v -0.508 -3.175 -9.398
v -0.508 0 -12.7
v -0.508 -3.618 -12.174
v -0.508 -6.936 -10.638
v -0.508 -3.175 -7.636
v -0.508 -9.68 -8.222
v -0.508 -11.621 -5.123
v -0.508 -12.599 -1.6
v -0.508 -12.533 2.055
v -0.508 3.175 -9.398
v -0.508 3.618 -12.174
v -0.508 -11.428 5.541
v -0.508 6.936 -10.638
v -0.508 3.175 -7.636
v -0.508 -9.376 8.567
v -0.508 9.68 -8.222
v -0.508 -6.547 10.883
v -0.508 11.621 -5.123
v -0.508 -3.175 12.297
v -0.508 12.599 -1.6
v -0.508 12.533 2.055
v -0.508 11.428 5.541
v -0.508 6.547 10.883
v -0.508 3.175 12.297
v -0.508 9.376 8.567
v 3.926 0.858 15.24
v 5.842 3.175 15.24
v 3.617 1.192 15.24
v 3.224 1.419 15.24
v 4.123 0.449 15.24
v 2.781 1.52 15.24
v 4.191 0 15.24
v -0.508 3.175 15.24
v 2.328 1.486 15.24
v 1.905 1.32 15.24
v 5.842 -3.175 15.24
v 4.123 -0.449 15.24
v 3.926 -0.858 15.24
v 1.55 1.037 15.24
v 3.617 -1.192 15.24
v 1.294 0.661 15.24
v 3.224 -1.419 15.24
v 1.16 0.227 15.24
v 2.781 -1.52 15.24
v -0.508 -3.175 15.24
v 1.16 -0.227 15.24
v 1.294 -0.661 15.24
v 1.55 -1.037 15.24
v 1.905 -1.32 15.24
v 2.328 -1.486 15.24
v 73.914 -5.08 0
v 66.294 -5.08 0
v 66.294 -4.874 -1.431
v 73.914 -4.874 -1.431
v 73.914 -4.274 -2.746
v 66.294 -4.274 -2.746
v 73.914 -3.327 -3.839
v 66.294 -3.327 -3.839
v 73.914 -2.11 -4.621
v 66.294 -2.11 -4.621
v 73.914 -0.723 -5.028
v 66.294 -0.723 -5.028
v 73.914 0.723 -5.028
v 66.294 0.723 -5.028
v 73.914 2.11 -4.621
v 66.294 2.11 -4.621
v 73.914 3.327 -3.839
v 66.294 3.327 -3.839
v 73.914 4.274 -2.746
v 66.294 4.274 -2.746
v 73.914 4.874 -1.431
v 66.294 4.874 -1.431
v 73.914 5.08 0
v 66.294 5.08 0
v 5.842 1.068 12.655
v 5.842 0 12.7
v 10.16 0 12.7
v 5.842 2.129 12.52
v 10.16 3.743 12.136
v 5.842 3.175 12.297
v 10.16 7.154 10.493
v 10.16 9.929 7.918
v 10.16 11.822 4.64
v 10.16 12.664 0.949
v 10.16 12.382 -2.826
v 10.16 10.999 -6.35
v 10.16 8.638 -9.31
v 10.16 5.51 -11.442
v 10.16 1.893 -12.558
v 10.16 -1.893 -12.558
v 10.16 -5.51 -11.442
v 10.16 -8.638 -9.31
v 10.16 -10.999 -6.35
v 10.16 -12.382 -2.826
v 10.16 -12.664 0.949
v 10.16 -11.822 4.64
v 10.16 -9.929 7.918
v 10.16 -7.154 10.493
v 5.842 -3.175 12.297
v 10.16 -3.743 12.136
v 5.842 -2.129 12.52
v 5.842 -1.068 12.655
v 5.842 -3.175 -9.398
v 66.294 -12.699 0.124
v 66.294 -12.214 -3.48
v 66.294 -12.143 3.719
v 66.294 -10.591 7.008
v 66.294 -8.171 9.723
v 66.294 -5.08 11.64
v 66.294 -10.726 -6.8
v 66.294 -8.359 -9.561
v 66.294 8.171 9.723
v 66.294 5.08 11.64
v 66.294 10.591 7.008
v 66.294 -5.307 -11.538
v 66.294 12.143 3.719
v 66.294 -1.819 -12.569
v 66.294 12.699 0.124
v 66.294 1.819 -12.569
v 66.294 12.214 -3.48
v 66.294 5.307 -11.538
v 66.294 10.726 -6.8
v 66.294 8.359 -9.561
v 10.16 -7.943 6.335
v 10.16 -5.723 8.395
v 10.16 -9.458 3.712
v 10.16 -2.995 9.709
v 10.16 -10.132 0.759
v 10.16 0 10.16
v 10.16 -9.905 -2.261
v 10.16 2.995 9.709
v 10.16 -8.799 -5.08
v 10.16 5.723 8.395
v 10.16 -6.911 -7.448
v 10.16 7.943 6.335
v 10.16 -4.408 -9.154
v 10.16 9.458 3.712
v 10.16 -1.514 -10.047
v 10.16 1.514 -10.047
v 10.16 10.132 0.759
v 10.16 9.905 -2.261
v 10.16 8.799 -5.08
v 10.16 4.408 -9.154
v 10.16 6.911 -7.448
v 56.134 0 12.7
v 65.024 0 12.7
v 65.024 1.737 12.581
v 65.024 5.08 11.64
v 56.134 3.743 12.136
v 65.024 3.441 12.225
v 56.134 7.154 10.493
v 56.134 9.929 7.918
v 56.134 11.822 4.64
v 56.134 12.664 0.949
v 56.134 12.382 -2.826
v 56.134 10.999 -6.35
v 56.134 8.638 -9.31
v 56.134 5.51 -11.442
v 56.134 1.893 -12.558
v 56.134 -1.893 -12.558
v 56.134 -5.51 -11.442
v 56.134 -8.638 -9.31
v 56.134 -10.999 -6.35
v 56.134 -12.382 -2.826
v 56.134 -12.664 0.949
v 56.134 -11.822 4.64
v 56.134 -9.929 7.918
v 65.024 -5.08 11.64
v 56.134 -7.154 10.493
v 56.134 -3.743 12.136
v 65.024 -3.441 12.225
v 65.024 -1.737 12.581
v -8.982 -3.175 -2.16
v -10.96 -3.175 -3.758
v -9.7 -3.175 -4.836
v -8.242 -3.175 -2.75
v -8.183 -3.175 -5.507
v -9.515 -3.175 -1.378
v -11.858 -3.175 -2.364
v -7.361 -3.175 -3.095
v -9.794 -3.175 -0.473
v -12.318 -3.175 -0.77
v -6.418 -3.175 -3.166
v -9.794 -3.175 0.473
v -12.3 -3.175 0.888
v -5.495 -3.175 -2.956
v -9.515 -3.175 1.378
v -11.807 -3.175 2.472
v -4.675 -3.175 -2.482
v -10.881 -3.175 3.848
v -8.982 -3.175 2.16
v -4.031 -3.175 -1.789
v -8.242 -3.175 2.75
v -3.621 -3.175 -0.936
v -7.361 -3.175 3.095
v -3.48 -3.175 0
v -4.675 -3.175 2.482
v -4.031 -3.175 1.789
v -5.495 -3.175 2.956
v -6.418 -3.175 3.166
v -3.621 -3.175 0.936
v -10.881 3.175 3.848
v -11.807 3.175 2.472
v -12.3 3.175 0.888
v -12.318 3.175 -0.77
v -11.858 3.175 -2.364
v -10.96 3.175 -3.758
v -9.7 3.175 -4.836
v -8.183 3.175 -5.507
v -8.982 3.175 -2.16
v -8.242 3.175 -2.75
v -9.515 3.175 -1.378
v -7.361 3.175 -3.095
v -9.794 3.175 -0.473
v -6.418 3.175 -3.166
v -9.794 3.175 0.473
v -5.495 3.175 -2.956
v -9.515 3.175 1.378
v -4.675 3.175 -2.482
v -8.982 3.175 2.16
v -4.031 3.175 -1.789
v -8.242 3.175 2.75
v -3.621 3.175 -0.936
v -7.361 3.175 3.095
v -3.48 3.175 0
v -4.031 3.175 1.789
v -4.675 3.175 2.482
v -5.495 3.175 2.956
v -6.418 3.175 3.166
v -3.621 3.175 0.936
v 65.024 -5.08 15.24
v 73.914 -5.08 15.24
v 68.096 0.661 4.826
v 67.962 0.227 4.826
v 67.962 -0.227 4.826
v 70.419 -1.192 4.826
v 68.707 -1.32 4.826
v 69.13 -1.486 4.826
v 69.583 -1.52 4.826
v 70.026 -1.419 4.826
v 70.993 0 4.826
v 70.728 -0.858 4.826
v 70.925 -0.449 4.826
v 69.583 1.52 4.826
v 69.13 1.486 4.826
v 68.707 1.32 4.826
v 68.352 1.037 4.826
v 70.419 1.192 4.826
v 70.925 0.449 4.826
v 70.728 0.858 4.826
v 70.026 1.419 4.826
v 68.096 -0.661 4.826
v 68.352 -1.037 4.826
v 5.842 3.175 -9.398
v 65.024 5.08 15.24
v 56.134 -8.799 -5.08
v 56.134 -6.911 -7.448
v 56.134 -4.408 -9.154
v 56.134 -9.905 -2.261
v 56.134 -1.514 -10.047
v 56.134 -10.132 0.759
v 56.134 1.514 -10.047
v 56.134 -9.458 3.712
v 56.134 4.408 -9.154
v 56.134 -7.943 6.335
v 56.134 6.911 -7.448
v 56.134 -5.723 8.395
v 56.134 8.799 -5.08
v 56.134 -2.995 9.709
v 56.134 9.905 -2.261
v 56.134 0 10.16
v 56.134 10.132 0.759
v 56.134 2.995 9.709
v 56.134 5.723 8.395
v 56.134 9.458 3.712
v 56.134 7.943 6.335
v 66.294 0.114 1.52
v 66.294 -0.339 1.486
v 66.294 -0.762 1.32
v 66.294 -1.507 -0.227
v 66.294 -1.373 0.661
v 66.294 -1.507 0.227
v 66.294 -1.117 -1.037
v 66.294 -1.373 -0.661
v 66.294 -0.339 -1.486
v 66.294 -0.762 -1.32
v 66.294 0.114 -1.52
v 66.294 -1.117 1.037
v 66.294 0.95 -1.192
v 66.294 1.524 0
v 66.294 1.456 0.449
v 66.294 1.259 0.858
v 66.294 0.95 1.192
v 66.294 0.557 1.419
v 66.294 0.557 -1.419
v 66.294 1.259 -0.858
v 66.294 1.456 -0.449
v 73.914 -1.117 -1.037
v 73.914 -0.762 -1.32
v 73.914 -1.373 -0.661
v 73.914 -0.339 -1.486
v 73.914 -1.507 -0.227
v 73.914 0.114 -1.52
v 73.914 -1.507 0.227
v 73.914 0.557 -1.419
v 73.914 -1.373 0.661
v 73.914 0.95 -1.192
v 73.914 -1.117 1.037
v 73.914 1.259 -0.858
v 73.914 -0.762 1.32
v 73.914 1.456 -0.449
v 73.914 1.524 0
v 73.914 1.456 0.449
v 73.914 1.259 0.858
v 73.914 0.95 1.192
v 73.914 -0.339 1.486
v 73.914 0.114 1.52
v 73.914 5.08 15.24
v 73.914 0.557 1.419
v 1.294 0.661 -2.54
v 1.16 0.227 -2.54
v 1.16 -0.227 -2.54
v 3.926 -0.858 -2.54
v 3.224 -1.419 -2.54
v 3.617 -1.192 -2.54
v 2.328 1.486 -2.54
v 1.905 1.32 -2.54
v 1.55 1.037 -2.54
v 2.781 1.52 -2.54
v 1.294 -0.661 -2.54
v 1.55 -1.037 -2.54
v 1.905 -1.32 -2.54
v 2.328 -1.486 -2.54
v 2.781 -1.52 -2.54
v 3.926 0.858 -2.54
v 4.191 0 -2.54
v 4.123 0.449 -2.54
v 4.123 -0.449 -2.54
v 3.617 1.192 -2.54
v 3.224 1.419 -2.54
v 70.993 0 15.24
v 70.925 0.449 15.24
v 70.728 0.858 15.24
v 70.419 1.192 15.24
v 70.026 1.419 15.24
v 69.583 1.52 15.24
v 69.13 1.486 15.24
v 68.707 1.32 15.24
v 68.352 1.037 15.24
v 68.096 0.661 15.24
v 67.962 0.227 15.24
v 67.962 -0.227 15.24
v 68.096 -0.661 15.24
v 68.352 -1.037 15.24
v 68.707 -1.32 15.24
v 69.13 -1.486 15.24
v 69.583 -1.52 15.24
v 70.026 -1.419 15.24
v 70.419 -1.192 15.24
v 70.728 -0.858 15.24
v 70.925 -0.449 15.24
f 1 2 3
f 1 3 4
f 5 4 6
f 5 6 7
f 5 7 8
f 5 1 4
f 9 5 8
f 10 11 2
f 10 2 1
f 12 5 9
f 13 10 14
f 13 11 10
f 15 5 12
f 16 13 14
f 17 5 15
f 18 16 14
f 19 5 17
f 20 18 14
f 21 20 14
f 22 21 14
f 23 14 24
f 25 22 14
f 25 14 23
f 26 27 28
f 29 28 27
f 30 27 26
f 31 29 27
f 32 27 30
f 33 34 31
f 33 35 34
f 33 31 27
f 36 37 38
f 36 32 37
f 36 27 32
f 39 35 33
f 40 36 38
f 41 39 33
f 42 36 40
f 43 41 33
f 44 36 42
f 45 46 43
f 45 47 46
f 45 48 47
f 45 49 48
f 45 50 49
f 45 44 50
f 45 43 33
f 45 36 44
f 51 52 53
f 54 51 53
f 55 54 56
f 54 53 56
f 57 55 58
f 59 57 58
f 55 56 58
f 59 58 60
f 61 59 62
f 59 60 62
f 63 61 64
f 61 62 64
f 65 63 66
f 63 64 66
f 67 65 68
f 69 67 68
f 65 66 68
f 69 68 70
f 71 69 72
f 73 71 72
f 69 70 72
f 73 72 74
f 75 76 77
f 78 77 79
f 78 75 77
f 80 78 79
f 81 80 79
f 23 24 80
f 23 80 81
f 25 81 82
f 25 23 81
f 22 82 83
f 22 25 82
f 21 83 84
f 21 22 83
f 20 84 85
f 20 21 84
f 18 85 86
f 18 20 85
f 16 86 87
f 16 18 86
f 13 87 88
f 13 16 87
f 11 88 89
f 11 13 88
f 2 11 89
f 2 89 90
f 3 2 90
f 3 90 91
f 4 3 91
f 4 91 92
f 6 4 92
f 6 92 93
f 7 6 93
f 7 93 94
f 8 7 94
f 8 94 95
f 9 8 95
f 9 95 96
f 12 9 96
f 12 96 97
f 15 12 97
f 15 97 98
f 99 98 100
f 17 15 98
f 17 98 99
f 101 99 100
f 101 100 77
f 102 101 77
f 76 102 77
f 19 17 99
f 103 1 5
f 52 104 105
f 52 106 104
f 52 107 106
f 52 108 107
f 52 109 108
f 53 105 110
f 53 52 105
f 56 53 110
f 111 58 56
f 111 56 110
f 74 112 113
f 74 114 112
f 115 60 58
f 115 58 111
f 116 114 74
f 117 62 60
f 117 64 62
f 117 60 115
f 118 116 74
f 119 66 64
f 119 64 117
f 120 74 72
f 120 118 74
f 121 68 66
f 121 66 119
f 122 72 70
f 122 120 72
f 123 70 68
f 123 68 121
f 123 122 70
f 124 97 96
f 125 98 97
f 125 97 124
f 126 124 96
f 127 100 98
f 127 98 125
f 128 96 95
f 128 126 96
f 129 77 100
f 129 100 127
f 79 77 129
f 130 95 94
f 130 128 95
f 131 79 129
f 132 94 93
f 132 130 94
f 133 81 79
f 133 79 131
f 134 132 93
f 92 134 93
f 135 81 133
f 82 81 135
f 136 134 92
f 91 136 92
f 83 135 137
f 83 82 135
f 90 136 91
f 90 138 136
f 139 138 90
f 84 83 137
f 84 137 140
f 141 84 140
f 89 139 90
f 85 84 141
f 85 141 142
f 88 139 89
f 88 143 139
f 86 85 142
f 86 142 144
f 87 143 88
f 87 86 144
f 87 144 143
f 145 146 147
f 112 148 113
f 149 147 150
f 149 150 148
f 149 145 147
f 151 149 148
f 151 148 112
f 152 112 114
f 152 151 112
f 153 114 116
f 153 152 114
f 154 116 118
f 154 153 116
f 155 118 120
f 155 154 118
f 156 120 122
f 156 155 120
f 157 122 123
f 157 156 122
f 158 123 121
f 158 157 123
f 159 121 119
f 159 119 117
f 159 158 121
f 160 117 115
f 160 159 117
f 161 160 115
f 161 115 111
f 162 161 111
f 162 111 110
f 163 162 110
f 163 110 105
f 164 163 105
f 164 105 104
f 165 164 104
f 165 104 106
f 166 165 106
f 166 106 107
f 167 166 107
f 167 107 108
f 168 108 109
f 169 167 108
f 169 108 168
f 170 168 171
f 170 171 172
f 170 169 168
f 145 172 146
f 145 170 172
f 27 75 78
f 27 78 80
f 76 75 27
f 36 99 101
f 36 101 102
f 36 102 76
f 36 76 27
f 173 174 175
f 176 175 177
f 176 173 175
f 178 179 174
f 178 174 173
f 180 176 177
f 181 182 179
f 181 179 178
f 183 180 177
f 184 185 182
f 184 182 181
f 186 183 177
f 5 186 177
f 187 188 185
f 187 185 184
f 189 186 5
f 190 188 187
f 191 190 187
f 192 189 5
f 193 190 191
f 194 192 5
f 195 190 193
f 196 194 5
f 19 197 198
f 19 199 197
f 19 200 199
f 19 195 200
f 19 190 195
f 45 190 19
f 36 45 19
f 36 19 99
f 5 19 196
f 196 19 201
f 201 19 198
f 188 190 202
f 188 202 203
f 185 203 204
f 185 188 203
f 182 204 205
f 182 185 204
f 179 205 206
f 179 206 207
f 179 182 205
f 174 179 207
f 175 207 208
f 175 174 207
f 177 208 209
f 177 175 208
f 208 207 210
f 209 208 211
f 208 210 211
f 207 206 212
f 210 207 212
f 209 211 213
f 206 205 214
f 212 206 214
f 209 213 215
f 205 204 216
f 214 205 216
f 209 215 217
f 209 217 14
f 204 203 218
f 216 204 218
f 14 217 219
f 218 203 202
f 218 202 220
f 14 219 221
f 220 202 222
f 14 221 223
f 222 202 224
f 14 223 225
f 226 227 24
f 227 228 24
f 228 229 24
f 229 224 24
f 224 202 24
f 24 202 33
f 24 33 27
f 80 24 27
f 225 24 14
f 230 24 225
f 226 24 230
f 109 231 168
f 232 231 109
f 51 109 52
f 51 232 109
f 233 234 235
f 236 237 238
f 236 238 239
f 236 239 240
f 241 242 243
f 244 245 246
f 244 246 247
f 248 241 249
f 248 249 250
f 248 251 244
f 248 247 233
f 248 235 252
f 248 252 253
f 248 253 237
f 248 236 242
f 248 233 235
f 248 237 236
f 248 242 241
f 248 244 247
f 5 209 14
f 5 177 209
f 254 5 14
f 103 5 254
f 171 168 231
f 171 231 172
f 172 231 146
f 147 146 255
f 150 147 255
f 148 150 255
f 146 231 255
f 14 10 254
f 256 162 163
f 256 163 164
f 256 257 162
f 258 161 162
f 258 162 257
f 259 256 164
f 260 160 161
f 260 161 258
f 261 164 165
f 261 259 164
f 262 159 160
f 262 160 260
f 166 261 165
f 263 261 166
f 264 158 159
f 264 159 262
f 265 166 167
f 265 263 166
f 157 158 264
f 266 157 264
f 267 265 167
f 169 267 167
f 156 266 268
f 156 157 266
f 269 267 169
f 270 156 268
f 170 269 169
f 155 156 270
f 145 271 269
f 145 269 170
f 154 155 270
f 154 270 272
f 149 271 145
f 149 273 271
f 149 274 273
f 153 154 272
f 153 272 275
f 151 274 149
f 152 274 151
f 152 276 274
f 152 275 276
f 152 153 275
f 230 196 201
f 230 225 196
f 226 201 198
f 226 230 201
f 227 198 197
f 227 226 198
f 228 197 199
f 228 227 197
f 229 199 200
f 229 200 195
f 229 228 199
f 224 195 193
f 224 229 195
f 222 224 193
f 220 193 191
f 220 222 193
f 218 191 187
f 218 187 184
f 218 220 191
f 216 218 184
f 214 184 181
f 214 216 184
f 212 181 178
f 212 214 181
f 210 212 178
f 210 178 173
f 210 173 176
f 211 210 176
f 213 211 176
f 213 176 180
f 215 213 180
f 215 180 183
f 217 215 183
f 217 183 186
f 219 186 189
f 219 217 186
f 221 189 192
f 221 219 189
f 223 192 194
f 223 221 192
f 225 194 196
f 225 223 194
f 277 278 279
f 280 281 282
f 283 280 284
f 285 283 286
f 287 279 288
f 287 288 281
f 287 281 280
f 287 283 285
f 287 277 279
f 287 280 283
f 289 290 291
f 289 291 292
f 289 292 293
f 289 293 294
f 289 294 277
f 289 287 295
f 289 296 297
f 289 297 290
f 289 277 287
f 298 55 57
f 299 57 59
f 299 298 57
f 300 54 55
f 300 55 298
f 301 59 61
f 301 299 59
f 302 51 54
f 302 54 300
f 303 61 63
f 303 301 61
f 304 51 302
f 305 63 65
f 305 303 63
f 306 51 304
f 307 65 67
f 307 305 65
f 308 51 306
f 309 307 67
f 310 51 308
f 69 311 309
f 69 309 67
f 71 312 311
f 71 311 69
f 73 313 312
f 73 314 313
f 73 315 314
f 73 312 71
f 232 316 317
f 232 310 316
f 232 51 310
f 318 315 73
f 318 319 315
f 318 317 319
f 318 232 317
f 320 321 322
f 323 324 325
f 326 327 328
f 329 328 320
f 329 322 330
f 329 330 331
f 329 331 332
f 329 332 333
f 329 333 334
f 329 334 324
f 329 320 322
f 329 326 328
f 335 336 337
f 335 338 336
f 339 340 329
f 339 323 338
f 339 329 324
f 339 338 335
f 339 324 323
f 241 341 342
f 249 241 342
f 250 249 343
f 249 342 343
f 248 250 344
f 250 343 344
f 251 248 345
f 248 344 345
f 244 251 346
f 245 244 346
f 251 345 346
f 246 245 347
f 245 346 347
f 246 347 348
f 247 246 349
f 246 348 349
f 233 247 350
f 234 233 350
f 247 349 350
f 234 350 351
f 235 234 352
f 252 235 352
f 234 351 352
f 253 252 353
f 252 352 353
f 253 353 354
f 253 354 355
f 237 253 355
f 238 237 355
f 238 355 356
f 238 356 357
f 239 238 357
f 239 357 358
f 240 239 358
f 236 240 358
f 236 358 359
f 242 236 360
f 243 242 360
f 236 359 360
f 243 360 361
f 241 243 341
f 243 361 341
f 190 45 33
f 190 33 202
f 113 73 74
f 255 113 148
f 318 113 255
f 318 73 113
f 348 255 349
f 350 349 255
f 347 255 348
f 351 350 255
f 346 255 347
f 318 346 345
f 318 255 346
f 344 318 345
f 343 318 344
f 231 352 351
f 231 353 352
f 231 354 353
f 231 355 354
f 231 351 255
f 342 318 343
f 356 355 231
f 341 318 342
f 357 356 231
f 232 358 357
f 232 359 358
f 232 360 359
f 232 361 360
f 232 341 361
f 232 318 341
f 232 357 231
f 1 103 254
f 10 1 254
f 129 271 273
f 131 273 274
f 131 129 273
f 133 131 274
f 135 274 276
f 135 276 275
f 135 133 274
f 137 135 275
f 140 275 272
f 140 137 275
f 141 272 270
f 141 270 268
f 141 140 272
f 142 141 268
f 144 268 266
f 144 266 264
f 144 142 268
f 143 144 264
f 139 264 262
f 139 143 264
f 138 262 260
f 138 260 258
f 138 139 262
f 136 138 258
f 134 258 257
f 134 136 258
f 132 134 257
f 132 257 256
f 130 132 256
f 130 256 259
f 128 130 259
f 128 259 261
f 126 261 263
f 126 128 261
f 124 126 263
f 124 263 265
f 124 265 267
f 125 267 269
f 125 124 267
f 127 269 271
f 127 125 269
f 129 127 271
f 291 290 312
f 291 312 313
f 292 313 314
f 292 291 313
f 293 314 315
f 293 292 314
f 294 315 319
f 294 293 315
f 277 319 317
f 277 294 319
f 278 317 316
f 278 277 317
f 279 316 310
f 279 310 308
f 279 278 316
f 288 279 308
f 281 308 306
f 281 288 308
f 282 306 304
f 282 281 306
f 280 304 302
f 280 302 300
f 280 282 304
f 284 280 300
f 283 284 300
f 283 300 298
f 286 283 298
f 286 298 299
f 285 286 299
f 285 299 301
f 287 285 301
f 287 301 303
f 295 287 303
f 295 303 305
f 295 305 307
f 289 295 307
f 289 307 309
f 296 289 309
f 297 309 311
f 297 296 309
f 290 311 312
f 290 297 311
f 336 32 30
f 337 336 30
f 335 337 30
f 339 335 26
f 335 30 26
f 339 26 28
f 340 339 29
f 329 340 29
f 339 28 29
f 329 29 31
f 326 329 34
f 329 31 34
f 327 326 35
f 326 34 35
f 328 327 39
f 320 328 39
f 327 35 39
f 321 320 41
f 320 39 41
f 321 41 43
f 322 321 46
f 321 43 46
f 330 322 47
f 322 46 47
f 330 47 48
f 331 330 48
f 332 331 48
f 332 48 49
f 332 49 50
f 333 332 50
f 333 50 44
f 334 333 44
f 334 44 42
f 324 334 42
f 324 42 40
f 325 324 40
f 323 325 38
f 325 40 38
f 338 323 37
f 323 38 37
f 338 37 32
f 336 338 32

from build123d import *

# Parameters (mm, degrees)
F0_W      = 5.842
F0_H      = 12.7
F0_R      = 3.175
F2_DEPTH  = 3.175
F3_DEPTH  = 6.35
F4_R      = 1.524
F5_DEPTH  = 7.62
F6_DEPTH  = 1.27
F7_R      = 1.524
F8_DEPTH  = 17.78
F9_R      = 1.524
F10_DEPTH = 10.414


with BuildPart() as f1:
    # F0 (on Front) → F1 (revolve)
    with BuildSketch(Plane.XZ):
        Polygon((5.842, 12.7), (5.842, 0), (66.294, 0), (66.294, 12.7), (56.134, 12.7), (56.134, 10.16), (10.16, 10.16), (10.16, 12.7), align=None)
    revolve(axis=Axis((-3.3274, 0, 0), (-1, 0, 0)))

    # F0 (on Front) → F2 (join, symmetric)
    with BuildSketch(Plane.XZ):
        with BuildLine():
            Line((-0.9398, 0), (0, 0))
            Line((0, 0), (0, 12.7))
            Line((0, 12.7), (5.842, 12.7))
            Line((5.842, 12.7), (5.842, 15.24))
            Line((5.842, 15.24), (-0.508, 15.24))
            Line((-0.508, 15.24), (-10.8806298187, 3.8475430269))
            ThreePointArc((-10.8806298187, 3.8475430269), (-4.5919612295, 5.3297205562), (-0.9398, 0))
        make_face()
        with BuildLine():
            Line((5.842, 0), (0, 0))
            Line((0, 0), (-0.9398, 0))
            ThreePointArc((-0.9398, 0), (-3.1957909266, -4.5493385486), (-8.1826630726, -5.5069827884))
            Line((-8.1826630726, -5.5069827884), (5.842, -9.398))
            Line((5.842, -9.398), (5.842, 0))
        make_face()
        with Locations((2.921, 6.35)):
            Rectangle(F0_W, F0_H)
        with BuildLine():
            ThreePointArc((-8.1826630726, -5.5069827884), (-3.1957909266, -4.5493385486), (-0.9398, 0))
            ThreePointArc((-0.9398, 0), (-4.5919612295, 5.3297205562), (-10.8806298187, 3.8475430269))
            ThreePointArc((-10.8806298187, 3.8475430269), (-12.1459778134, -1.5837270034), (-8.1826630726, -5.5069827884))
        make_face()
        with Locations((-6.6548, 0)):
            Circle(F0_R, mode=Mode.SUBTRACT)
    extrude(amount=F2_DEPTH, both=True)

    # F3 (add): a face of the model
    f3_faces = [f1.faces().sort_by_distance(p)[0] for p in [
        (5.842, 3.5313700488, 1.4493610621),
    ]]
    extrude(f3_faces, amount=F3_DEPTH)

    # F4 (on face) → F5 (join)
    with BuildSketch(Plane.YZ.offset(66.294)):
        with BuildLine():
            ThreePointArc((-5.08, 0), (0, 5.08), (5.08, 0))
            Line((5.08, 0), (5.08, 11.6397422652))
            ThreePointArc((5.08, 11.6397422652), (0, 12.7), (-5.08, 11.6397422652))
            Line((-5.08, 11.6397422652), (-5.08, 0))
        make_face()
        with BuildLine():
            ThreePointArc((-5.08, 0), (0, -5.08), (5.08, 0))
            ThreePointArc((5.08, 0), (0, 5.08), (-5.08, 0))
        make_face()
        Circle(F4_R, mode=Mode.SUBTRACT)
        with BuildLine():
            ThreePointArc((-5.08, 11.6397422652), (0, 12.7), (5.08, 11.6397422652))
            Line((5.08, 11.6397422652), (5.08, 15.24))
            Line((5.08, 15.24), (-5.08, 15.24))
            Line((-5.08, 15.24), (-5.08, 11.6397422652))
        make_face()
    extrude(amount=F5_DEPTH)

    # F6 (add): a face of the model
    f6_faces = [f1.faces().sort_by_distance(p)[0] for p in [
        (66.294, 0, 13.7792682875),
    ]]
    extrude(f6_faces, amount=F6_DEPTH)

    # F7 (on face) → F8 (cut)
    with BuildSketch(Plane.XY.offset(15.24)):
        with Locations((2.667, 0)):
            Circle(F7_R)
    extrude(amount=-F8_DEPTH, mode=Mode.SUBTRACT)

    # F9 (on face) → F10 (cut)
    with BuildSketch(Plane.XY.offset(15.24)):
        with Locations((69.469, 0)):
            Circle(F9_R)
    extrude(amount=-F10_DEPTH, mode=Mode.SUBTRACT)


solid = f1.part
